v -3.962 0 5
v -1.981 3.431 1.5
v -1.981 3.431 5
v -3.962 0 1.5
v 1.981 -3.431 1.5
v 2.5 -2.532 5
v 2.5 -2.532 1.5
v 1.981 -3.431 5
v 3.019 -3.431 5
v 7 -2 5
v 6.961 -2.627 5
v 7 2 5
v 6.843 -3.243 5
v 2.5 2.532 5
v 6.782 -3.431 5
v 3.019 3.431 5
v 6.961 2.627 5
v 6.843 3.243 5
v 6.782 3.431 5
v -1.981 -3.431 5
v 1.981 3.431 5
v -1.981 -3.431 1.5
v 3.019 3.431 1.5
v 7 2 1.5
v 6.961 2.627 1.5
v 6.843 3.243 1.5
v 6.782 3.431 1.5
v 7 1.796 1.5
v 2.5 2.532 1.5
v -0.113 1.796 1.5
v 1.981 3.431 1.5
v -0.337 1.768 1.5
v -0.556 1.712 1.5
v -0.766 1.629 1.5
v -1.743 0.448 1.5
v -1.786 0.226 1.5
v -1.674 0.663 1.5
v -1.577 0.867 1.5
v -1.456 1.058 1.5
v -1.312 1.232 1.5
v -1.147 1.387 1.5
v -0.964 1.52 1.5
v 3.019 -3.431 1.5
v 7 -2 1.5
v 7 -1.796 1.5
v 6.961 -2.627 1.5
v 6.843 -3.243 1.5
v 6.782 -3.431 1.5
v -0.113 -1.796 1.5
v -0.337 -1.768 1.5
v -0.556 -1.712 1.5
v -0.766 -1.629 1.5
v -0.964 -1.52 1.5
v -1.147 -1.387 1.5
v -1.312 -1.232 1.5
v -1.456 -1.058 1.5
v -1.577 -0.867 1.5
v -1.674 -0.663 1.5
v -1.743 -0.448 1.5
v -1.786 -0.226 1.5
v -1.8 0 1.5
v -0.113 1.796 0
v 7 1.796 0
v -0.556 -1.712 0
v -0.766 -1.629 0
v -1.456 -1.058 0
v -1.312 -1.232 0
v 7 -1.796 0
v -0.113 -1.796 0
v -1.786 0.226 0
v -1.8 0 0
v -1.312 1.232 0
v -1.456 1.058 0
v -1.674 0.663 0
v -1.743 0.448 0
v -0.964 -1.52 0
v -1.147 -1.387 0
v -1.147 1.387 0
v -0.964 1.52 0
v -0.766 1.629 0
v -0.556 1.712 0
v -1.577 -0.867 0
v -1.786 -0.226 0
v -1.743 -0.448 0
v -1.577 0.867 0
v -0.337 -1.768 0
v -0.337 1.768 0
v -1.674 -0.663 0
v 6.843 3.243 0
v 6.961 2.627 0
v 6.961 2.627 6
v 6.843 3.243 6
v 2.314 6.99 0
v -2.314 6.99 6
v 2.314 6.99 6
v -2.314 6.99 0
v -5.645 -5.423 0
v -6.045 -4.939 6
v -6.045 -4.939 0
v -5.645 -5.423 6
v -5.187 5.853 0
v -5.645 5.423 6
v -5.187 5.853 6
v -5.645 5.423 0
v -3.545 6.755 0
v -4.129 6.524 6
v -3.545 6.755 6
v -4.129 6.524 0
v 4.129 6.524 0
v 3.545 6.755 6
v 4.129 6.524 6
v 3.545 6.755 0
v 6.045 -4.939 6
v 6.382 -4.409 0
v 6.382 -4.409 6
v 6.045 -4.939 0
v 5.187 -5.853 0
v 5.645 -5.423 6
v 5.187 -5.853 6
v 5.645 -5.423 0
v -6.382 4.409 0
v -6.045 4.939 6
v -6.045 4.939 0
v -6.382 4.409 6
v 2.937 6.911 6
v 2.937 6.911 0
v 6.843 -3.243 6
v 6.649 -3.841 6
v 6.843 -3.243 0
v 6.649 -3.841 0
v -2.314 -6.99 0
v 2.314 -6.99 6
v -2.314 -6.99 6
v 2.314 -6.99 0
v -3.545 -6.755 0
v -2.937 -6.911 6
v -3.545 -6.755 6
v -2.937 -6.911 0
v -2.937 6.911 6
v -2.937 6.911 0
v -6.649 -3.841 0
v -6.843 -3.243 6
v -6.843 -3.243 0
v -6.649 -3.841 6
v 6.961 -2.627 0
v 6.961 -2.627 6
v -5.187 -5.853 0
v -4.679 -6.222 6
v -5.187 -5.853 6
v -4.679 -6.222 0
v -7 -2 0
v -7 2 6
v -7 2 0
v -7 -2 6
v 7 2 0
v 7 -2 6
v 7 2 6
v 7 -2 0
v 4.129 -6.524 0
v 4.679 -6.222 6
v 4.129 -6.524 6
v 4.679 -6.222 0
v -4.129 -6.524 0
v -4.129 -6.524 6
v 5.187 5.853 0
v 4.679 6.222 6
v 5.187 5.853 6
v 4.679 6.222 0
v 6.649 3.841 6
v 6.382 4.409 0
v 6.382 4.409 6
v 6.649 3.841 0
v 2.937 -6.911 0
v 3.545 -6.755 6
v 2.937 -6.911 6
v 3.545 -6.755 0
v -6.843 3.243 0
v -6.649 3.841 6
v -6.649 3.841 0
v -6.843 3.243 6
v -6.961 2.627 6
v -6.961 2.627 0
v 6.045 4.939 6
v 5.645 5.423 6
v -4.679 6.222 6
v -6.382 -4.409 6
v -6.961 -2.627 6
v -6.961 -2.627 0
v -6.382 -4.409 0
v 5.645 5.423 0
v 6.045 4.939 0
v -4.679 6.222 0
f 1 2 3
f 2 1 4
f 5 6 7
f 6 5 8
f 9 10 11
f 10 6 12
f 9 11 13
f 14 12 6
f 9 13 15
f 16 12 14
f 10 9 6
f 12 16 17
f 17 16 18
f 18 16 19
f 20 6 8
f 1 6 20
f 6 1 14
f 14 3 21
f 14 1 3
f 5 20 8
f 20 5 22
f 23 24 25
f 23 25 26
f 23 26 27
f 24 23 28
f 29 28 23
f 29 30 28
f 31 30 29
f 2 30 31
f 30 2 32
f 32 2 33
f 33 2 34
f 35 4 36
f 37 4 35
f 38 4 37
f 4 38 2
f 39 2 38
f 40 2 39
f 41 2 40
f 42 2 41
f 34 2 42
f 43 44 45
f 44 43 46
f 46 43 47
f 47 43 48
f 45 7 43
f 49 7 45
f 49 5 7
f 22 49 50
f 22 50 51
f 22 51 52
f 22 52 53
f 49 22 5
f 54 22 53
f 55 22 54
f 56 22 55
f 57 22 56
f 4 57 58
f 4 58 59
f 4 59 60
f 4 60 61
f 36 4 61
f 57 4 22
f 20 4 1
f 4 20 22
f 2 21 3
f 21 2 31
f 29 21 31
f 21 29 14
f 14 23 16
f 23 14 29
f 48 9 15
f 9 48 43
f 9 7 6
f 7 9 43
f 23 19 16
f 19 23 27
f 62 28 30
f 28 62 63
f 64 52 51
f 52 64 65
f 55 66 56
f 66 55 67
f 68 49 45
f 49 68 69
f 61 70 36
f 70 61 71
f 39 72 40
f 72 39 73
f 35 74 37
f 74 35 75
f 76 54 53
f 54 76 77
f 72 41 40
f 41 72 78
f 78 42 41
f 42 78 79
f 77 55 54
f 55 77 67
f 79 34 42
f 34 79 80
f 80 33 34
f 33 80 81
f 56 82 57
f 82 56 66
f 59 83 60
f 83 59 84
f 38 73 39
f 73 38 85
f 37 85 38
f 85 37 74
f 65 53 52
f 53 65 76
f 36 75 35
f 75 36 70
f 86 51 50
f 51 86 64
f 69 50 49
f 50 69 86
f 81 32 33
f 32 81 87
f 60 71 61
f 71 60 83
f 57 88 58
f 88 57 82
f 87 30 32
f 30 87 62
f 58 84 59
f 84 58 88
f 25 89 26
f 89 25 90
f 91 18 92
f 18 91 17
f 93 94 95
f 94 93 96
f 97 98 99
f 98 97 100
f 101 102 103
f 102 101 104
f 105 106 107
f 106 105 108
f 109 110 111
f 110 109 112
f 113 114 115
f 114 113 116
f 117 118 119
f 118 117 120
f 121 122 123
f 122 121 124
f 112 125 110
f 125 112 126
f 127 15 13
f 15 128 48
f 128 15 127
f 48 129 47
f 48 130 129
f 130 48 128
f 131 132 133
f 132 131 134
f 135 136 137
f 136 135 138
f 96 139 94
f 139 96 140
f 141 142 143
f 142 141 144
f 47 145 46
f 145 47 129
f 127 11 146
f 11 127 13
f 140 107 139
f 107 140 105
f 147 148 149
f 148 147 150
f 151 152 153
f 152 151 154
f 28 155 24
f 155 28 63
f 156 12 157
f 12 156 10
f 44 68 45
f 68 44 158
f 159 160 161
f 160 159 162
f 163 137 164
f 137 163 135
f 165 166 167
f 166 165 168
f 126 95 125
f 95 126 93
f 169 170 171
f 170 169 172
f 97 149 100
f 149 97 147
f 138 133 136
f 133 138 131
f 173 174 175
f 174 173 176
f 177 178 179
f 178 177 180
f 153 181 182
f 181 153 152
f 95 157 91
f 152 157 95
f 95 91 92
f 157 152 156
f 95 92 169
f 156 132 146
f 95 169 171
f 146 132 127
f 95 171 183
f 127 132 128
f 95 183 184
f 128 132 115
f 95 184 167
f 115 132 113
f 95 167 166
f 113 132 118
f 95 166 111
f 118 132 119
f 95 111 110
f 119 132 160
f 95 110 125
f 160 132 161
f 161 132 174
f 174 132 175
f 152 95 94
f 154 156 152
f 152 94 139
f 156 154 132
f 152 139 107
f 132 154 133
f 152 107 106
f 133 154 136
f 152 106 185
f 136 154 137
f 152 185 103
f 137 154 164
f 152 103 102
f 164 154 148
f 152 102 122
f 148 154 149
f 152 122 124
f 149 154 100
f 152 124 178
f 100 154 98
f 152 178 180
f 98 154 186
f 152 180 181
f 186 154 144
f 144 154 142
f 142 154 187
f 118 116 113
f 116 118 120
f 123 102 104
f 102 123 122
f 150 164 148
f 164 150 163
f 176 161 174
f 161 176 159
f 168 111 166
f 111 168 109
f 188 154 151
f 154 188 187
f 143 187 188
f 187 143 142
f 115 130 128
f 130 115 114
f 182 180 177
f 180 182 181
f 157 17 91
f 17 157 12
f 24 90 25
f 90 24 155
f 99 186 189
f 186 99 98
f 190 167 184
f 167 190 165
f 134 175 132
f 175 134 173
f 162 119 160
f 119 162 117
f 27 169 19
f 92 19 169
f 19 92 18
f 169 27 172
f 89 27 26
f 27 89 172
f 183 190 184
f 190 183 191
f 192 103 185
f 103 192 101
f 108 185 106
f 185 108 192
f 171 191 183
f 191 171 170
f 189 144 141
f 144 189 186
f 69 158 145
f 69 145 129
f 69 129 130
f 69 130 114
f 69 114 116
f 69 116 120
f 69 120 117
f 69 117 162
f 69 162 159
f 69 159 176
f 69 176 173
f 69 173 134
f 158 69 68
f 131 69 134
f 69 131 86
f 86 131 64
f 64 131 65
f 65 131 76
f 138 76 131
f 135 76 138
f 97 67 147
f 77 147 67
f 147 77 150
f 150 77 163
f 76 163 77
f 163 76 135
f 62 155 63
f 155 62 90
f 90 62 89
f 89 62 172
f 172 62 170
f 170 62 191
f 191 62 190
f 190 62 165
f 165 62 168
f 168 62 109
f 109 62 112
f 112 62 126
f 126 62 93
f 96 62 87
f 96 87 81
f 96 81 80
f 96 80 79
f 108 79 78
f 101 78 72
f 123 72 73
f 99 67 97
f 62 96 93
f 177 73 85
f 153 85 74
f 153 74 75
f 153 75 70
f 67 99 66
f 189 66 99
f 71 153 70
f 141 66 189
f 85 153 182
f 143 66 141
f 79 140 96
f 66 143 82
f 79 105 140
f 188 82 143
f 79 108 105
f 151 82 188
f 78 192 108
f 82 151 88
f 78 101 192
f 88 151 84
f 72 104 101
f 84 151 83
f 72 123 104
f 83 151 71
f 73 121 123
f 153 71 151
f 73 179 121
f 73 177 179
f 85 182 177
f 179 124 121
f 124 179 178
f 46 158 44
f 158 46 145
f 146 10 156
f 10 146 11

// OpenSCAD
$fn = 50;


difference() {
	union() {
		hull() {
			translate(v = [2.0000000000, -2.0000000000, 0]) {
				cylinder(h = 6, r = 5);
			}
			translate(v = [-2.0000000000, -2.0000000000, 0]) {
				cylinder(h = 6, r = 5);
			}
			translate(v = [2.0000000000, 2.0000000000, 0]) {
				cylinder(h = 6, r = 5);
			}
			translate(v = [-2.0000000000, 2.0000000000, 0]) {
				cylinder(h = 6, r = 5);
			}
		}
	}
	union() {
		translate(v = [0, 0, 1.5000000000]) {
			rotate(a = [0, 0, 0]) {
				difference() {
					union() {
						#linear_extrude(height = 3.5000000000) {
							polygon(points = [[3.9620000000, 0.0000000000], [1.9810000000, 3.4311926498], [-1.9810000000, 3.4311926498], [-3.9620000000, 0.0000000000], [-1.9810000000, -3.4311926498], [1.9810000000, -3.4311926498]]);
						}
					}
					union();
				}
			}
		}
		translate(v = [5, 0, 1.5000000000]) {
			rotate(a = [0, 0, 0]) {
				difference() {
					union() {
						#linear_extrude(height = 3.5000000000) {
							polygon(points = [[3.9620000000, 0.0000000000], [1.9810000000, 3.4311926498], [-1.9810000000, 3.4311926498], [-3.9620000000, 0.0000000000], [-1.9810000000, -3.4311926498], [1.9810000000, -3.4311926498]]);
						}
					}
					union();
				}
			}
		}
		translate(v = [6, 0, 1.5000000000]) {
			rotate(a = [0, 0, 0]) {
				difference() {
					union() {
						#linear_extrude(height = 3.5000000000) {
							polygon(points = [[3.9620000000, 0.0000000000], [1.9810000000, 3.4311926498], [-1.9810000000, 3.4311926498], [-3.9620000000, 0.0000000000], [-1.9810000000, -3.4311926498], [1.9810000000, -3.4311926498]]);
						}
					}
					union();
				}
			}
		}
		translate(v = [7, 0, 1.5000000000]) {
			rotate(a = [0, 0, 0]) {
				difference() {
					union() {
						#linear_extrude(height = 3.5000000000) {
							polygon(points = [[3.9620000000, 0.0000000000], [1.9810000000, 3.4311926498], [-1.9810000000, 3.4311926498], [-3.9620000000, 0.0000000000], [-1.9810000000, -3.4311926498], [1.9810000000, -3.4311926498]]);
						}
					}
					union();
				}
			}
		}
		translate(v = [5, 0, -4.5000000000]) {
			rotate(a = [0, 0, 0]) {
				difference() {
					union() {
						hull() {
							translate(v = [5.0000000000, 0, 0]) {
								cylinder(h = 6, r = 1.8000000000, r1 = 1.8000000000, r2 = 1.8000000000);
							}
							translate(v = [-5.0000000000, 0, 0]) {
								cylinder(h = 6, r = 1.8000000000, r1 = 1.8000000000, r2 = 1.8000000000);
							}
						}
					}
					union();
				}
			}
		}
	}
}
